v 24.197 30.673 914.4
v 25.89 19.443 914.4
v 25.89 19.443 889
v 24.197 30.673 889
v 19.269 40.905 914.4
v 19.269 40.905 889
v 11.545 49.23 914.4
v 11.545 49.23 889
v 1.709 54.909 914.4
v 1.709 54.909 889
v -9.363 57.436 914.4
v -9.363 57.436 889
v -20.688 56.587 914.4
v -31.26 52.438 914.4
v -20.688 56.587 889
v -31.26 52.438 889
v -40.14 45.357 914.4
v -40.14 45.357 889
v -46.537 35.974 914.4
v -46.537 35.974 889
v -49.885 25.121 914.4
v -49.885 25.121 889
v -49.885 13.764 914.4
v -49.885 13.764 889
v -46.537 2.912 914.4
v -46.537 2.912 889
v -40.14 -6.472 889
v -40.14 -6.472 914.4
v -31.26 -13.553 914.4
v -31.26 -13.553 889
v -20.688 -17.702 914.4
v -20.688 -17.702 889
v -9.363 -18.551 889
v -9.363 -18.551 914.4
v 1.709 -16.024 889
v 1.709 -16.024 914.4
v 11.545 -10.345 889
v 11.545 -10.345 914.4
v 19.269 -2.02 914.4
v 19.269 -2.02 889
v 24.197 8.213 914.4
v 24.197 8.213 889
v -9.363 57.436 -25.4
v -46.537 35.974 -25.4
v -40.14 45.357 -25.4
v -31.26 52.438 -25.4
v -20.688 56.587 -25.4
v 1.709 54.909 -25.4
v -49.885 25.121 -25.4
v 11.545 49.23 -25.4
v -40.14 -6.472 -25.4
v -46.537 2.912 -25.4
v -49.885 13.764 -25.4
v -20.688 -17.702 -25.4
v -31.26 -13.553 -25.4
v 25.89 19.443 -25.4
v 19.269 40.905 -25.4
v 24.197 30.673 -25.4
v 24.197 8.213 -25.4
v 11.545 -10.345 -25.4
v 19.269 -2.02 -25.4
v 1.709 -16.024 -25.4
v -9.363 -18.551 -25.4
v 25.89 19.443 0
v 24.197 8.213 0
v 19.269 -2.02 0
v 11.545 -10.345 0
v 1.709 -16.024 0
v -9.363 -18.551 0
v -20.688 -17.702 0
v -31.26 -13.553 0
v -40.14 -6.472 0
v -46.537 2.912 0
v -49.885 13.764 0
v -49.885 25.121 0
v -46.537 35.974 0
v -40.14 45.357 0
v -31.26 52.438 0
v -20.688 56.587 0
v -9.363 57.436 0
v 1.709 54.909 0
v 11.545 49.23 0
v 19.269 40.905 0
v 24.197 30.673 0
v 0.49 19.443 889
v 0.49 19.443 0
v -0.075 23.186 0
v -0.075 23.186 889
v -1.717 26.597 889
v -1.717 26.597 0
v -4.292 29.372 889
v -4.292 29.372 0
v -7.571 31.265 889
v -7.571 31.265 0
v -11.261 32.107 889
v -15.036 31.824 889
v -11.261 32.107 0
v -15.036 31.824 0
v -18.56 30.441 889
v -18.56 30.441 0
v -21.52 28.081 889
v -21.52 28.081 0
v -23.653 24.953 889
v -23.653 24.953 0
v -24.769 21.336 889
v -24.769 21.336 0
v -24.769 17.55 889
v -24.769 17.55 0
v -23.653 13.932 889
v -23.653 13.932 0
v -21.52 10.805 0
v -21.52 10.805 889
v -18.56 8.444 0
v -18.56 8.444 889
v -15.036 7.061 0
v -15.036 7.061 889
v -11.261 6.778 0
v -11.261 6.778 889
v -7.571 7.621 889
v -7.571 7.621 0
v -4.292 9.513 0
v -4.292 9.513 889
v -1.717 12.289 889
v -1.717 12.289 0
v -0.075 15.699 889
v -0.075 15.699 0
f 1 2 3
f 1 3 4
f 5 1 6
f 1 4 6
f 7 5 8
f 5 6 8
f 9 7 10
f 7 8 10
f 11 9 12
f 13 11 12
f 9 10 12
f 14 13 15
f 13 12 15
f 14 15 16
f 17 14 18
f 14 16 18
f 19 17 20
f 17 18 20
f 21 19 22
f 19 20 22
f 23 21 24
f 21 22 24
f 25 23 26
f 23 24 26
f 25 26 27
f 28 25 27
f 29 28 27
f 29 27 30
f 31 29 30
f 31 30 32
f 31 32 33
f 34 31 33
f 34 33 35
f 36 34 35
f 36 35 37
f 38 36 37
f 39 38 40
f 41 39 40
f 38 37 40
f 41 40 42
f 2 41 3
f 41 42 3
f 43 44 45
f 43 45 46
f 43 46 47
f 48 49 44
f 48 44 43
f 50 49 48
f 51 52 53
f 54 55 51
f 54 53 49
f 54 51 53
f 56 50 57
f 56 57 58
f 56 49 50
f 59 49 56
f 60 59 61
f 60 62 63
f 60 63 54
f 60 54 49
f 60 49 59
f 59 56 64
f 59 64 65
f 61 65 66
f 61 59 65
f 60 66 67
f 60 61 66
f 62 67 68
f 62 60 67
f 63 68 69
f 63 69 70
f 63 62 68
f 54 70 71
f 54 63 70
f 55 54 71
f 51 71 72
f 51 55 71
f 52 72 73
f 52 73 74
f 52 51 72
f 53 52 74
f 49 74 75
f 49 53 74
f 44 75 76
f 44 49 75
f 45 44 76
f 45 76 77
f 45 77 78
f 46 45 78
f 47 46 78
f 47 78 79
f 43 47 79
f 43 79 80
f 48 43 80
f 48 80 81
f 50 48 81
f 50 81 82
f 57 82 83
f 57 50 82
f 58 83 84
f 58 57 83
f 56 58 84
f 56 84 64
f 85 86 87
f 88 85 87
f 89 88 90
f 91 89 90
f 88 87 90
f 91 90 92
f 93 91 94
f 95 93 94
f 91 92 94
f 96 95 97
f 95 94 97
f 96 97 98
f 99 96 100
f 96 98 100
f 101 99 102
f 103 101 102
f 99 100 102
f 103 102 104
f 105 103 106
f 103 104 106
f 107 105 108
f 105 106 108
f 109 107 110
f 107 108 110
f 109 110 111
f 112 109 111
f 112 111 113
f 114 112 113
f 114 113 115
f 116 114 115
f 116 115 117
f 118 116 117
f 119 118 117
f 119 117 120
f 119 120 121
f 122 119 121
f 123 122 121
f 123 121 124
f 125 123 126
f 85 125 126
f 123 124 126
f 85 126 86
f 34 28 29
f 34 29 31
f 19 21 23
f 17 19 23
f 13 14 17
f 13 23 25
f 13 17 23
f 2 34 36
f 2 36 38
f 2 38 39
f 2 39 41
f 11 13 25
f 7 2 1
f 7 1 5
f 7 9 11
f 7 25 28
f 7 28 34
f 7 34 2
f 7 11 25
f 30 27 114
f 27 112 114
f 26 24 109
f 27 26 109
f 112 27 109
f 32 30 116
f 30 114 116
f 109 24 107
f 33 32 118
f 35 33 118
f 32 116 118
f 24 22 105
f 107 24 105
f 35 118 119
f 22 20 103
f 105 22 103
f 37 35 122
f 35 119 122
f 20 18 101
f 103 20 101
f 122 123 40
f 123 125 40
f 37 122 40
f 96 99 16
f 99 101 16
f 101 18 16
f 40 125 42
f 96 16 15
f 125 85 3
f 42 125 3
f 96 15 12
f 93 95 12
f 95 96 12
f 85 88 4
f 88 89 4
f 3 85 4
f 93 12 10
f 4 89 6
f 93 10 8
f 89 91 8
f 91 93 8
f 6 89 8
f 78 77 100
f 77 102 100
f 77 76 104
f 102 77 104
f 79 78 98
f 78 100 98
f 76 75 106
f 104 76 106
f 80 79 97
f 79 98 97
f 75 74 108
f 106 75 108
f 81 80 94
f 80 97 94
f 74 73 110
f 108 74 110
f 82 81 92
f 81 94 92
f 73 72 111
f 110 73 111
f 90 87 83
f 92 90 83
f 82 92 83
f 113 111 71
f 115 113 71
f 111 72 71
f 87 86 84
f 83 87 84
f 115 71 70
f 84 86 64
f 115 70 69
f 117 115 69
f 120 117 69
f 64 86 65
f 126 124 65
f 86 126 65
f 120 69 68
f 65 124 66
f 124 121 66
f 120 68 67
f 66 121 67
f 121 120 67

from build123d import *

# Parameters (mm, degrees)
SKETCH1_R           = 12.7
BOSS_EXTRUDE2_DEPTH = 889
SKETCH4_R           = 38.1
BOSS_EXTRUDE4_DEPTH = 25.4
BOSS_EXTRUDE5_START = 25.4
SKETCH5_R           = 38.1
BOSS_EXTRUDE5_DEPTH = 25.4


with BuildPart() as part:
    # Sketch1 → Boss-Extrude2 (new body)
    with BuildSketch(Plane.XY):
        with Locations((-12.210402701, 19.442718147)):
            Circle(SKETCH1_R)
    extrude(amount=BOSS_EXTRUDE2_DEPTH)

    # Sketch4 → Boss-Extrude4 (add)
    with BuildSketch(Plane.XY.offset(889)):
        with Locations((-12.210402701, 19.442718147)):
            Circle(SKETCH4_R)
    extrude(amount=BOSS_EXTRUDE4_DEPTH)

    # Sketch5 → Boss-Extrude5 (add)
    with BuildSketch(Plane(origin=(0, 0, 0), x_dir=(-1, 0, 0), z_dir=(0, 0, -1)).offset(BOSS_EXTRUDE5_START)):
        with Locations(Location((12.210402701, 19.442718147, 0), (0, 0, 180))):
            Circle(SKETCH5_R)
    extrude(amount=-BOSS_EXTRUDE5_DEPTH)


solid = part.part
